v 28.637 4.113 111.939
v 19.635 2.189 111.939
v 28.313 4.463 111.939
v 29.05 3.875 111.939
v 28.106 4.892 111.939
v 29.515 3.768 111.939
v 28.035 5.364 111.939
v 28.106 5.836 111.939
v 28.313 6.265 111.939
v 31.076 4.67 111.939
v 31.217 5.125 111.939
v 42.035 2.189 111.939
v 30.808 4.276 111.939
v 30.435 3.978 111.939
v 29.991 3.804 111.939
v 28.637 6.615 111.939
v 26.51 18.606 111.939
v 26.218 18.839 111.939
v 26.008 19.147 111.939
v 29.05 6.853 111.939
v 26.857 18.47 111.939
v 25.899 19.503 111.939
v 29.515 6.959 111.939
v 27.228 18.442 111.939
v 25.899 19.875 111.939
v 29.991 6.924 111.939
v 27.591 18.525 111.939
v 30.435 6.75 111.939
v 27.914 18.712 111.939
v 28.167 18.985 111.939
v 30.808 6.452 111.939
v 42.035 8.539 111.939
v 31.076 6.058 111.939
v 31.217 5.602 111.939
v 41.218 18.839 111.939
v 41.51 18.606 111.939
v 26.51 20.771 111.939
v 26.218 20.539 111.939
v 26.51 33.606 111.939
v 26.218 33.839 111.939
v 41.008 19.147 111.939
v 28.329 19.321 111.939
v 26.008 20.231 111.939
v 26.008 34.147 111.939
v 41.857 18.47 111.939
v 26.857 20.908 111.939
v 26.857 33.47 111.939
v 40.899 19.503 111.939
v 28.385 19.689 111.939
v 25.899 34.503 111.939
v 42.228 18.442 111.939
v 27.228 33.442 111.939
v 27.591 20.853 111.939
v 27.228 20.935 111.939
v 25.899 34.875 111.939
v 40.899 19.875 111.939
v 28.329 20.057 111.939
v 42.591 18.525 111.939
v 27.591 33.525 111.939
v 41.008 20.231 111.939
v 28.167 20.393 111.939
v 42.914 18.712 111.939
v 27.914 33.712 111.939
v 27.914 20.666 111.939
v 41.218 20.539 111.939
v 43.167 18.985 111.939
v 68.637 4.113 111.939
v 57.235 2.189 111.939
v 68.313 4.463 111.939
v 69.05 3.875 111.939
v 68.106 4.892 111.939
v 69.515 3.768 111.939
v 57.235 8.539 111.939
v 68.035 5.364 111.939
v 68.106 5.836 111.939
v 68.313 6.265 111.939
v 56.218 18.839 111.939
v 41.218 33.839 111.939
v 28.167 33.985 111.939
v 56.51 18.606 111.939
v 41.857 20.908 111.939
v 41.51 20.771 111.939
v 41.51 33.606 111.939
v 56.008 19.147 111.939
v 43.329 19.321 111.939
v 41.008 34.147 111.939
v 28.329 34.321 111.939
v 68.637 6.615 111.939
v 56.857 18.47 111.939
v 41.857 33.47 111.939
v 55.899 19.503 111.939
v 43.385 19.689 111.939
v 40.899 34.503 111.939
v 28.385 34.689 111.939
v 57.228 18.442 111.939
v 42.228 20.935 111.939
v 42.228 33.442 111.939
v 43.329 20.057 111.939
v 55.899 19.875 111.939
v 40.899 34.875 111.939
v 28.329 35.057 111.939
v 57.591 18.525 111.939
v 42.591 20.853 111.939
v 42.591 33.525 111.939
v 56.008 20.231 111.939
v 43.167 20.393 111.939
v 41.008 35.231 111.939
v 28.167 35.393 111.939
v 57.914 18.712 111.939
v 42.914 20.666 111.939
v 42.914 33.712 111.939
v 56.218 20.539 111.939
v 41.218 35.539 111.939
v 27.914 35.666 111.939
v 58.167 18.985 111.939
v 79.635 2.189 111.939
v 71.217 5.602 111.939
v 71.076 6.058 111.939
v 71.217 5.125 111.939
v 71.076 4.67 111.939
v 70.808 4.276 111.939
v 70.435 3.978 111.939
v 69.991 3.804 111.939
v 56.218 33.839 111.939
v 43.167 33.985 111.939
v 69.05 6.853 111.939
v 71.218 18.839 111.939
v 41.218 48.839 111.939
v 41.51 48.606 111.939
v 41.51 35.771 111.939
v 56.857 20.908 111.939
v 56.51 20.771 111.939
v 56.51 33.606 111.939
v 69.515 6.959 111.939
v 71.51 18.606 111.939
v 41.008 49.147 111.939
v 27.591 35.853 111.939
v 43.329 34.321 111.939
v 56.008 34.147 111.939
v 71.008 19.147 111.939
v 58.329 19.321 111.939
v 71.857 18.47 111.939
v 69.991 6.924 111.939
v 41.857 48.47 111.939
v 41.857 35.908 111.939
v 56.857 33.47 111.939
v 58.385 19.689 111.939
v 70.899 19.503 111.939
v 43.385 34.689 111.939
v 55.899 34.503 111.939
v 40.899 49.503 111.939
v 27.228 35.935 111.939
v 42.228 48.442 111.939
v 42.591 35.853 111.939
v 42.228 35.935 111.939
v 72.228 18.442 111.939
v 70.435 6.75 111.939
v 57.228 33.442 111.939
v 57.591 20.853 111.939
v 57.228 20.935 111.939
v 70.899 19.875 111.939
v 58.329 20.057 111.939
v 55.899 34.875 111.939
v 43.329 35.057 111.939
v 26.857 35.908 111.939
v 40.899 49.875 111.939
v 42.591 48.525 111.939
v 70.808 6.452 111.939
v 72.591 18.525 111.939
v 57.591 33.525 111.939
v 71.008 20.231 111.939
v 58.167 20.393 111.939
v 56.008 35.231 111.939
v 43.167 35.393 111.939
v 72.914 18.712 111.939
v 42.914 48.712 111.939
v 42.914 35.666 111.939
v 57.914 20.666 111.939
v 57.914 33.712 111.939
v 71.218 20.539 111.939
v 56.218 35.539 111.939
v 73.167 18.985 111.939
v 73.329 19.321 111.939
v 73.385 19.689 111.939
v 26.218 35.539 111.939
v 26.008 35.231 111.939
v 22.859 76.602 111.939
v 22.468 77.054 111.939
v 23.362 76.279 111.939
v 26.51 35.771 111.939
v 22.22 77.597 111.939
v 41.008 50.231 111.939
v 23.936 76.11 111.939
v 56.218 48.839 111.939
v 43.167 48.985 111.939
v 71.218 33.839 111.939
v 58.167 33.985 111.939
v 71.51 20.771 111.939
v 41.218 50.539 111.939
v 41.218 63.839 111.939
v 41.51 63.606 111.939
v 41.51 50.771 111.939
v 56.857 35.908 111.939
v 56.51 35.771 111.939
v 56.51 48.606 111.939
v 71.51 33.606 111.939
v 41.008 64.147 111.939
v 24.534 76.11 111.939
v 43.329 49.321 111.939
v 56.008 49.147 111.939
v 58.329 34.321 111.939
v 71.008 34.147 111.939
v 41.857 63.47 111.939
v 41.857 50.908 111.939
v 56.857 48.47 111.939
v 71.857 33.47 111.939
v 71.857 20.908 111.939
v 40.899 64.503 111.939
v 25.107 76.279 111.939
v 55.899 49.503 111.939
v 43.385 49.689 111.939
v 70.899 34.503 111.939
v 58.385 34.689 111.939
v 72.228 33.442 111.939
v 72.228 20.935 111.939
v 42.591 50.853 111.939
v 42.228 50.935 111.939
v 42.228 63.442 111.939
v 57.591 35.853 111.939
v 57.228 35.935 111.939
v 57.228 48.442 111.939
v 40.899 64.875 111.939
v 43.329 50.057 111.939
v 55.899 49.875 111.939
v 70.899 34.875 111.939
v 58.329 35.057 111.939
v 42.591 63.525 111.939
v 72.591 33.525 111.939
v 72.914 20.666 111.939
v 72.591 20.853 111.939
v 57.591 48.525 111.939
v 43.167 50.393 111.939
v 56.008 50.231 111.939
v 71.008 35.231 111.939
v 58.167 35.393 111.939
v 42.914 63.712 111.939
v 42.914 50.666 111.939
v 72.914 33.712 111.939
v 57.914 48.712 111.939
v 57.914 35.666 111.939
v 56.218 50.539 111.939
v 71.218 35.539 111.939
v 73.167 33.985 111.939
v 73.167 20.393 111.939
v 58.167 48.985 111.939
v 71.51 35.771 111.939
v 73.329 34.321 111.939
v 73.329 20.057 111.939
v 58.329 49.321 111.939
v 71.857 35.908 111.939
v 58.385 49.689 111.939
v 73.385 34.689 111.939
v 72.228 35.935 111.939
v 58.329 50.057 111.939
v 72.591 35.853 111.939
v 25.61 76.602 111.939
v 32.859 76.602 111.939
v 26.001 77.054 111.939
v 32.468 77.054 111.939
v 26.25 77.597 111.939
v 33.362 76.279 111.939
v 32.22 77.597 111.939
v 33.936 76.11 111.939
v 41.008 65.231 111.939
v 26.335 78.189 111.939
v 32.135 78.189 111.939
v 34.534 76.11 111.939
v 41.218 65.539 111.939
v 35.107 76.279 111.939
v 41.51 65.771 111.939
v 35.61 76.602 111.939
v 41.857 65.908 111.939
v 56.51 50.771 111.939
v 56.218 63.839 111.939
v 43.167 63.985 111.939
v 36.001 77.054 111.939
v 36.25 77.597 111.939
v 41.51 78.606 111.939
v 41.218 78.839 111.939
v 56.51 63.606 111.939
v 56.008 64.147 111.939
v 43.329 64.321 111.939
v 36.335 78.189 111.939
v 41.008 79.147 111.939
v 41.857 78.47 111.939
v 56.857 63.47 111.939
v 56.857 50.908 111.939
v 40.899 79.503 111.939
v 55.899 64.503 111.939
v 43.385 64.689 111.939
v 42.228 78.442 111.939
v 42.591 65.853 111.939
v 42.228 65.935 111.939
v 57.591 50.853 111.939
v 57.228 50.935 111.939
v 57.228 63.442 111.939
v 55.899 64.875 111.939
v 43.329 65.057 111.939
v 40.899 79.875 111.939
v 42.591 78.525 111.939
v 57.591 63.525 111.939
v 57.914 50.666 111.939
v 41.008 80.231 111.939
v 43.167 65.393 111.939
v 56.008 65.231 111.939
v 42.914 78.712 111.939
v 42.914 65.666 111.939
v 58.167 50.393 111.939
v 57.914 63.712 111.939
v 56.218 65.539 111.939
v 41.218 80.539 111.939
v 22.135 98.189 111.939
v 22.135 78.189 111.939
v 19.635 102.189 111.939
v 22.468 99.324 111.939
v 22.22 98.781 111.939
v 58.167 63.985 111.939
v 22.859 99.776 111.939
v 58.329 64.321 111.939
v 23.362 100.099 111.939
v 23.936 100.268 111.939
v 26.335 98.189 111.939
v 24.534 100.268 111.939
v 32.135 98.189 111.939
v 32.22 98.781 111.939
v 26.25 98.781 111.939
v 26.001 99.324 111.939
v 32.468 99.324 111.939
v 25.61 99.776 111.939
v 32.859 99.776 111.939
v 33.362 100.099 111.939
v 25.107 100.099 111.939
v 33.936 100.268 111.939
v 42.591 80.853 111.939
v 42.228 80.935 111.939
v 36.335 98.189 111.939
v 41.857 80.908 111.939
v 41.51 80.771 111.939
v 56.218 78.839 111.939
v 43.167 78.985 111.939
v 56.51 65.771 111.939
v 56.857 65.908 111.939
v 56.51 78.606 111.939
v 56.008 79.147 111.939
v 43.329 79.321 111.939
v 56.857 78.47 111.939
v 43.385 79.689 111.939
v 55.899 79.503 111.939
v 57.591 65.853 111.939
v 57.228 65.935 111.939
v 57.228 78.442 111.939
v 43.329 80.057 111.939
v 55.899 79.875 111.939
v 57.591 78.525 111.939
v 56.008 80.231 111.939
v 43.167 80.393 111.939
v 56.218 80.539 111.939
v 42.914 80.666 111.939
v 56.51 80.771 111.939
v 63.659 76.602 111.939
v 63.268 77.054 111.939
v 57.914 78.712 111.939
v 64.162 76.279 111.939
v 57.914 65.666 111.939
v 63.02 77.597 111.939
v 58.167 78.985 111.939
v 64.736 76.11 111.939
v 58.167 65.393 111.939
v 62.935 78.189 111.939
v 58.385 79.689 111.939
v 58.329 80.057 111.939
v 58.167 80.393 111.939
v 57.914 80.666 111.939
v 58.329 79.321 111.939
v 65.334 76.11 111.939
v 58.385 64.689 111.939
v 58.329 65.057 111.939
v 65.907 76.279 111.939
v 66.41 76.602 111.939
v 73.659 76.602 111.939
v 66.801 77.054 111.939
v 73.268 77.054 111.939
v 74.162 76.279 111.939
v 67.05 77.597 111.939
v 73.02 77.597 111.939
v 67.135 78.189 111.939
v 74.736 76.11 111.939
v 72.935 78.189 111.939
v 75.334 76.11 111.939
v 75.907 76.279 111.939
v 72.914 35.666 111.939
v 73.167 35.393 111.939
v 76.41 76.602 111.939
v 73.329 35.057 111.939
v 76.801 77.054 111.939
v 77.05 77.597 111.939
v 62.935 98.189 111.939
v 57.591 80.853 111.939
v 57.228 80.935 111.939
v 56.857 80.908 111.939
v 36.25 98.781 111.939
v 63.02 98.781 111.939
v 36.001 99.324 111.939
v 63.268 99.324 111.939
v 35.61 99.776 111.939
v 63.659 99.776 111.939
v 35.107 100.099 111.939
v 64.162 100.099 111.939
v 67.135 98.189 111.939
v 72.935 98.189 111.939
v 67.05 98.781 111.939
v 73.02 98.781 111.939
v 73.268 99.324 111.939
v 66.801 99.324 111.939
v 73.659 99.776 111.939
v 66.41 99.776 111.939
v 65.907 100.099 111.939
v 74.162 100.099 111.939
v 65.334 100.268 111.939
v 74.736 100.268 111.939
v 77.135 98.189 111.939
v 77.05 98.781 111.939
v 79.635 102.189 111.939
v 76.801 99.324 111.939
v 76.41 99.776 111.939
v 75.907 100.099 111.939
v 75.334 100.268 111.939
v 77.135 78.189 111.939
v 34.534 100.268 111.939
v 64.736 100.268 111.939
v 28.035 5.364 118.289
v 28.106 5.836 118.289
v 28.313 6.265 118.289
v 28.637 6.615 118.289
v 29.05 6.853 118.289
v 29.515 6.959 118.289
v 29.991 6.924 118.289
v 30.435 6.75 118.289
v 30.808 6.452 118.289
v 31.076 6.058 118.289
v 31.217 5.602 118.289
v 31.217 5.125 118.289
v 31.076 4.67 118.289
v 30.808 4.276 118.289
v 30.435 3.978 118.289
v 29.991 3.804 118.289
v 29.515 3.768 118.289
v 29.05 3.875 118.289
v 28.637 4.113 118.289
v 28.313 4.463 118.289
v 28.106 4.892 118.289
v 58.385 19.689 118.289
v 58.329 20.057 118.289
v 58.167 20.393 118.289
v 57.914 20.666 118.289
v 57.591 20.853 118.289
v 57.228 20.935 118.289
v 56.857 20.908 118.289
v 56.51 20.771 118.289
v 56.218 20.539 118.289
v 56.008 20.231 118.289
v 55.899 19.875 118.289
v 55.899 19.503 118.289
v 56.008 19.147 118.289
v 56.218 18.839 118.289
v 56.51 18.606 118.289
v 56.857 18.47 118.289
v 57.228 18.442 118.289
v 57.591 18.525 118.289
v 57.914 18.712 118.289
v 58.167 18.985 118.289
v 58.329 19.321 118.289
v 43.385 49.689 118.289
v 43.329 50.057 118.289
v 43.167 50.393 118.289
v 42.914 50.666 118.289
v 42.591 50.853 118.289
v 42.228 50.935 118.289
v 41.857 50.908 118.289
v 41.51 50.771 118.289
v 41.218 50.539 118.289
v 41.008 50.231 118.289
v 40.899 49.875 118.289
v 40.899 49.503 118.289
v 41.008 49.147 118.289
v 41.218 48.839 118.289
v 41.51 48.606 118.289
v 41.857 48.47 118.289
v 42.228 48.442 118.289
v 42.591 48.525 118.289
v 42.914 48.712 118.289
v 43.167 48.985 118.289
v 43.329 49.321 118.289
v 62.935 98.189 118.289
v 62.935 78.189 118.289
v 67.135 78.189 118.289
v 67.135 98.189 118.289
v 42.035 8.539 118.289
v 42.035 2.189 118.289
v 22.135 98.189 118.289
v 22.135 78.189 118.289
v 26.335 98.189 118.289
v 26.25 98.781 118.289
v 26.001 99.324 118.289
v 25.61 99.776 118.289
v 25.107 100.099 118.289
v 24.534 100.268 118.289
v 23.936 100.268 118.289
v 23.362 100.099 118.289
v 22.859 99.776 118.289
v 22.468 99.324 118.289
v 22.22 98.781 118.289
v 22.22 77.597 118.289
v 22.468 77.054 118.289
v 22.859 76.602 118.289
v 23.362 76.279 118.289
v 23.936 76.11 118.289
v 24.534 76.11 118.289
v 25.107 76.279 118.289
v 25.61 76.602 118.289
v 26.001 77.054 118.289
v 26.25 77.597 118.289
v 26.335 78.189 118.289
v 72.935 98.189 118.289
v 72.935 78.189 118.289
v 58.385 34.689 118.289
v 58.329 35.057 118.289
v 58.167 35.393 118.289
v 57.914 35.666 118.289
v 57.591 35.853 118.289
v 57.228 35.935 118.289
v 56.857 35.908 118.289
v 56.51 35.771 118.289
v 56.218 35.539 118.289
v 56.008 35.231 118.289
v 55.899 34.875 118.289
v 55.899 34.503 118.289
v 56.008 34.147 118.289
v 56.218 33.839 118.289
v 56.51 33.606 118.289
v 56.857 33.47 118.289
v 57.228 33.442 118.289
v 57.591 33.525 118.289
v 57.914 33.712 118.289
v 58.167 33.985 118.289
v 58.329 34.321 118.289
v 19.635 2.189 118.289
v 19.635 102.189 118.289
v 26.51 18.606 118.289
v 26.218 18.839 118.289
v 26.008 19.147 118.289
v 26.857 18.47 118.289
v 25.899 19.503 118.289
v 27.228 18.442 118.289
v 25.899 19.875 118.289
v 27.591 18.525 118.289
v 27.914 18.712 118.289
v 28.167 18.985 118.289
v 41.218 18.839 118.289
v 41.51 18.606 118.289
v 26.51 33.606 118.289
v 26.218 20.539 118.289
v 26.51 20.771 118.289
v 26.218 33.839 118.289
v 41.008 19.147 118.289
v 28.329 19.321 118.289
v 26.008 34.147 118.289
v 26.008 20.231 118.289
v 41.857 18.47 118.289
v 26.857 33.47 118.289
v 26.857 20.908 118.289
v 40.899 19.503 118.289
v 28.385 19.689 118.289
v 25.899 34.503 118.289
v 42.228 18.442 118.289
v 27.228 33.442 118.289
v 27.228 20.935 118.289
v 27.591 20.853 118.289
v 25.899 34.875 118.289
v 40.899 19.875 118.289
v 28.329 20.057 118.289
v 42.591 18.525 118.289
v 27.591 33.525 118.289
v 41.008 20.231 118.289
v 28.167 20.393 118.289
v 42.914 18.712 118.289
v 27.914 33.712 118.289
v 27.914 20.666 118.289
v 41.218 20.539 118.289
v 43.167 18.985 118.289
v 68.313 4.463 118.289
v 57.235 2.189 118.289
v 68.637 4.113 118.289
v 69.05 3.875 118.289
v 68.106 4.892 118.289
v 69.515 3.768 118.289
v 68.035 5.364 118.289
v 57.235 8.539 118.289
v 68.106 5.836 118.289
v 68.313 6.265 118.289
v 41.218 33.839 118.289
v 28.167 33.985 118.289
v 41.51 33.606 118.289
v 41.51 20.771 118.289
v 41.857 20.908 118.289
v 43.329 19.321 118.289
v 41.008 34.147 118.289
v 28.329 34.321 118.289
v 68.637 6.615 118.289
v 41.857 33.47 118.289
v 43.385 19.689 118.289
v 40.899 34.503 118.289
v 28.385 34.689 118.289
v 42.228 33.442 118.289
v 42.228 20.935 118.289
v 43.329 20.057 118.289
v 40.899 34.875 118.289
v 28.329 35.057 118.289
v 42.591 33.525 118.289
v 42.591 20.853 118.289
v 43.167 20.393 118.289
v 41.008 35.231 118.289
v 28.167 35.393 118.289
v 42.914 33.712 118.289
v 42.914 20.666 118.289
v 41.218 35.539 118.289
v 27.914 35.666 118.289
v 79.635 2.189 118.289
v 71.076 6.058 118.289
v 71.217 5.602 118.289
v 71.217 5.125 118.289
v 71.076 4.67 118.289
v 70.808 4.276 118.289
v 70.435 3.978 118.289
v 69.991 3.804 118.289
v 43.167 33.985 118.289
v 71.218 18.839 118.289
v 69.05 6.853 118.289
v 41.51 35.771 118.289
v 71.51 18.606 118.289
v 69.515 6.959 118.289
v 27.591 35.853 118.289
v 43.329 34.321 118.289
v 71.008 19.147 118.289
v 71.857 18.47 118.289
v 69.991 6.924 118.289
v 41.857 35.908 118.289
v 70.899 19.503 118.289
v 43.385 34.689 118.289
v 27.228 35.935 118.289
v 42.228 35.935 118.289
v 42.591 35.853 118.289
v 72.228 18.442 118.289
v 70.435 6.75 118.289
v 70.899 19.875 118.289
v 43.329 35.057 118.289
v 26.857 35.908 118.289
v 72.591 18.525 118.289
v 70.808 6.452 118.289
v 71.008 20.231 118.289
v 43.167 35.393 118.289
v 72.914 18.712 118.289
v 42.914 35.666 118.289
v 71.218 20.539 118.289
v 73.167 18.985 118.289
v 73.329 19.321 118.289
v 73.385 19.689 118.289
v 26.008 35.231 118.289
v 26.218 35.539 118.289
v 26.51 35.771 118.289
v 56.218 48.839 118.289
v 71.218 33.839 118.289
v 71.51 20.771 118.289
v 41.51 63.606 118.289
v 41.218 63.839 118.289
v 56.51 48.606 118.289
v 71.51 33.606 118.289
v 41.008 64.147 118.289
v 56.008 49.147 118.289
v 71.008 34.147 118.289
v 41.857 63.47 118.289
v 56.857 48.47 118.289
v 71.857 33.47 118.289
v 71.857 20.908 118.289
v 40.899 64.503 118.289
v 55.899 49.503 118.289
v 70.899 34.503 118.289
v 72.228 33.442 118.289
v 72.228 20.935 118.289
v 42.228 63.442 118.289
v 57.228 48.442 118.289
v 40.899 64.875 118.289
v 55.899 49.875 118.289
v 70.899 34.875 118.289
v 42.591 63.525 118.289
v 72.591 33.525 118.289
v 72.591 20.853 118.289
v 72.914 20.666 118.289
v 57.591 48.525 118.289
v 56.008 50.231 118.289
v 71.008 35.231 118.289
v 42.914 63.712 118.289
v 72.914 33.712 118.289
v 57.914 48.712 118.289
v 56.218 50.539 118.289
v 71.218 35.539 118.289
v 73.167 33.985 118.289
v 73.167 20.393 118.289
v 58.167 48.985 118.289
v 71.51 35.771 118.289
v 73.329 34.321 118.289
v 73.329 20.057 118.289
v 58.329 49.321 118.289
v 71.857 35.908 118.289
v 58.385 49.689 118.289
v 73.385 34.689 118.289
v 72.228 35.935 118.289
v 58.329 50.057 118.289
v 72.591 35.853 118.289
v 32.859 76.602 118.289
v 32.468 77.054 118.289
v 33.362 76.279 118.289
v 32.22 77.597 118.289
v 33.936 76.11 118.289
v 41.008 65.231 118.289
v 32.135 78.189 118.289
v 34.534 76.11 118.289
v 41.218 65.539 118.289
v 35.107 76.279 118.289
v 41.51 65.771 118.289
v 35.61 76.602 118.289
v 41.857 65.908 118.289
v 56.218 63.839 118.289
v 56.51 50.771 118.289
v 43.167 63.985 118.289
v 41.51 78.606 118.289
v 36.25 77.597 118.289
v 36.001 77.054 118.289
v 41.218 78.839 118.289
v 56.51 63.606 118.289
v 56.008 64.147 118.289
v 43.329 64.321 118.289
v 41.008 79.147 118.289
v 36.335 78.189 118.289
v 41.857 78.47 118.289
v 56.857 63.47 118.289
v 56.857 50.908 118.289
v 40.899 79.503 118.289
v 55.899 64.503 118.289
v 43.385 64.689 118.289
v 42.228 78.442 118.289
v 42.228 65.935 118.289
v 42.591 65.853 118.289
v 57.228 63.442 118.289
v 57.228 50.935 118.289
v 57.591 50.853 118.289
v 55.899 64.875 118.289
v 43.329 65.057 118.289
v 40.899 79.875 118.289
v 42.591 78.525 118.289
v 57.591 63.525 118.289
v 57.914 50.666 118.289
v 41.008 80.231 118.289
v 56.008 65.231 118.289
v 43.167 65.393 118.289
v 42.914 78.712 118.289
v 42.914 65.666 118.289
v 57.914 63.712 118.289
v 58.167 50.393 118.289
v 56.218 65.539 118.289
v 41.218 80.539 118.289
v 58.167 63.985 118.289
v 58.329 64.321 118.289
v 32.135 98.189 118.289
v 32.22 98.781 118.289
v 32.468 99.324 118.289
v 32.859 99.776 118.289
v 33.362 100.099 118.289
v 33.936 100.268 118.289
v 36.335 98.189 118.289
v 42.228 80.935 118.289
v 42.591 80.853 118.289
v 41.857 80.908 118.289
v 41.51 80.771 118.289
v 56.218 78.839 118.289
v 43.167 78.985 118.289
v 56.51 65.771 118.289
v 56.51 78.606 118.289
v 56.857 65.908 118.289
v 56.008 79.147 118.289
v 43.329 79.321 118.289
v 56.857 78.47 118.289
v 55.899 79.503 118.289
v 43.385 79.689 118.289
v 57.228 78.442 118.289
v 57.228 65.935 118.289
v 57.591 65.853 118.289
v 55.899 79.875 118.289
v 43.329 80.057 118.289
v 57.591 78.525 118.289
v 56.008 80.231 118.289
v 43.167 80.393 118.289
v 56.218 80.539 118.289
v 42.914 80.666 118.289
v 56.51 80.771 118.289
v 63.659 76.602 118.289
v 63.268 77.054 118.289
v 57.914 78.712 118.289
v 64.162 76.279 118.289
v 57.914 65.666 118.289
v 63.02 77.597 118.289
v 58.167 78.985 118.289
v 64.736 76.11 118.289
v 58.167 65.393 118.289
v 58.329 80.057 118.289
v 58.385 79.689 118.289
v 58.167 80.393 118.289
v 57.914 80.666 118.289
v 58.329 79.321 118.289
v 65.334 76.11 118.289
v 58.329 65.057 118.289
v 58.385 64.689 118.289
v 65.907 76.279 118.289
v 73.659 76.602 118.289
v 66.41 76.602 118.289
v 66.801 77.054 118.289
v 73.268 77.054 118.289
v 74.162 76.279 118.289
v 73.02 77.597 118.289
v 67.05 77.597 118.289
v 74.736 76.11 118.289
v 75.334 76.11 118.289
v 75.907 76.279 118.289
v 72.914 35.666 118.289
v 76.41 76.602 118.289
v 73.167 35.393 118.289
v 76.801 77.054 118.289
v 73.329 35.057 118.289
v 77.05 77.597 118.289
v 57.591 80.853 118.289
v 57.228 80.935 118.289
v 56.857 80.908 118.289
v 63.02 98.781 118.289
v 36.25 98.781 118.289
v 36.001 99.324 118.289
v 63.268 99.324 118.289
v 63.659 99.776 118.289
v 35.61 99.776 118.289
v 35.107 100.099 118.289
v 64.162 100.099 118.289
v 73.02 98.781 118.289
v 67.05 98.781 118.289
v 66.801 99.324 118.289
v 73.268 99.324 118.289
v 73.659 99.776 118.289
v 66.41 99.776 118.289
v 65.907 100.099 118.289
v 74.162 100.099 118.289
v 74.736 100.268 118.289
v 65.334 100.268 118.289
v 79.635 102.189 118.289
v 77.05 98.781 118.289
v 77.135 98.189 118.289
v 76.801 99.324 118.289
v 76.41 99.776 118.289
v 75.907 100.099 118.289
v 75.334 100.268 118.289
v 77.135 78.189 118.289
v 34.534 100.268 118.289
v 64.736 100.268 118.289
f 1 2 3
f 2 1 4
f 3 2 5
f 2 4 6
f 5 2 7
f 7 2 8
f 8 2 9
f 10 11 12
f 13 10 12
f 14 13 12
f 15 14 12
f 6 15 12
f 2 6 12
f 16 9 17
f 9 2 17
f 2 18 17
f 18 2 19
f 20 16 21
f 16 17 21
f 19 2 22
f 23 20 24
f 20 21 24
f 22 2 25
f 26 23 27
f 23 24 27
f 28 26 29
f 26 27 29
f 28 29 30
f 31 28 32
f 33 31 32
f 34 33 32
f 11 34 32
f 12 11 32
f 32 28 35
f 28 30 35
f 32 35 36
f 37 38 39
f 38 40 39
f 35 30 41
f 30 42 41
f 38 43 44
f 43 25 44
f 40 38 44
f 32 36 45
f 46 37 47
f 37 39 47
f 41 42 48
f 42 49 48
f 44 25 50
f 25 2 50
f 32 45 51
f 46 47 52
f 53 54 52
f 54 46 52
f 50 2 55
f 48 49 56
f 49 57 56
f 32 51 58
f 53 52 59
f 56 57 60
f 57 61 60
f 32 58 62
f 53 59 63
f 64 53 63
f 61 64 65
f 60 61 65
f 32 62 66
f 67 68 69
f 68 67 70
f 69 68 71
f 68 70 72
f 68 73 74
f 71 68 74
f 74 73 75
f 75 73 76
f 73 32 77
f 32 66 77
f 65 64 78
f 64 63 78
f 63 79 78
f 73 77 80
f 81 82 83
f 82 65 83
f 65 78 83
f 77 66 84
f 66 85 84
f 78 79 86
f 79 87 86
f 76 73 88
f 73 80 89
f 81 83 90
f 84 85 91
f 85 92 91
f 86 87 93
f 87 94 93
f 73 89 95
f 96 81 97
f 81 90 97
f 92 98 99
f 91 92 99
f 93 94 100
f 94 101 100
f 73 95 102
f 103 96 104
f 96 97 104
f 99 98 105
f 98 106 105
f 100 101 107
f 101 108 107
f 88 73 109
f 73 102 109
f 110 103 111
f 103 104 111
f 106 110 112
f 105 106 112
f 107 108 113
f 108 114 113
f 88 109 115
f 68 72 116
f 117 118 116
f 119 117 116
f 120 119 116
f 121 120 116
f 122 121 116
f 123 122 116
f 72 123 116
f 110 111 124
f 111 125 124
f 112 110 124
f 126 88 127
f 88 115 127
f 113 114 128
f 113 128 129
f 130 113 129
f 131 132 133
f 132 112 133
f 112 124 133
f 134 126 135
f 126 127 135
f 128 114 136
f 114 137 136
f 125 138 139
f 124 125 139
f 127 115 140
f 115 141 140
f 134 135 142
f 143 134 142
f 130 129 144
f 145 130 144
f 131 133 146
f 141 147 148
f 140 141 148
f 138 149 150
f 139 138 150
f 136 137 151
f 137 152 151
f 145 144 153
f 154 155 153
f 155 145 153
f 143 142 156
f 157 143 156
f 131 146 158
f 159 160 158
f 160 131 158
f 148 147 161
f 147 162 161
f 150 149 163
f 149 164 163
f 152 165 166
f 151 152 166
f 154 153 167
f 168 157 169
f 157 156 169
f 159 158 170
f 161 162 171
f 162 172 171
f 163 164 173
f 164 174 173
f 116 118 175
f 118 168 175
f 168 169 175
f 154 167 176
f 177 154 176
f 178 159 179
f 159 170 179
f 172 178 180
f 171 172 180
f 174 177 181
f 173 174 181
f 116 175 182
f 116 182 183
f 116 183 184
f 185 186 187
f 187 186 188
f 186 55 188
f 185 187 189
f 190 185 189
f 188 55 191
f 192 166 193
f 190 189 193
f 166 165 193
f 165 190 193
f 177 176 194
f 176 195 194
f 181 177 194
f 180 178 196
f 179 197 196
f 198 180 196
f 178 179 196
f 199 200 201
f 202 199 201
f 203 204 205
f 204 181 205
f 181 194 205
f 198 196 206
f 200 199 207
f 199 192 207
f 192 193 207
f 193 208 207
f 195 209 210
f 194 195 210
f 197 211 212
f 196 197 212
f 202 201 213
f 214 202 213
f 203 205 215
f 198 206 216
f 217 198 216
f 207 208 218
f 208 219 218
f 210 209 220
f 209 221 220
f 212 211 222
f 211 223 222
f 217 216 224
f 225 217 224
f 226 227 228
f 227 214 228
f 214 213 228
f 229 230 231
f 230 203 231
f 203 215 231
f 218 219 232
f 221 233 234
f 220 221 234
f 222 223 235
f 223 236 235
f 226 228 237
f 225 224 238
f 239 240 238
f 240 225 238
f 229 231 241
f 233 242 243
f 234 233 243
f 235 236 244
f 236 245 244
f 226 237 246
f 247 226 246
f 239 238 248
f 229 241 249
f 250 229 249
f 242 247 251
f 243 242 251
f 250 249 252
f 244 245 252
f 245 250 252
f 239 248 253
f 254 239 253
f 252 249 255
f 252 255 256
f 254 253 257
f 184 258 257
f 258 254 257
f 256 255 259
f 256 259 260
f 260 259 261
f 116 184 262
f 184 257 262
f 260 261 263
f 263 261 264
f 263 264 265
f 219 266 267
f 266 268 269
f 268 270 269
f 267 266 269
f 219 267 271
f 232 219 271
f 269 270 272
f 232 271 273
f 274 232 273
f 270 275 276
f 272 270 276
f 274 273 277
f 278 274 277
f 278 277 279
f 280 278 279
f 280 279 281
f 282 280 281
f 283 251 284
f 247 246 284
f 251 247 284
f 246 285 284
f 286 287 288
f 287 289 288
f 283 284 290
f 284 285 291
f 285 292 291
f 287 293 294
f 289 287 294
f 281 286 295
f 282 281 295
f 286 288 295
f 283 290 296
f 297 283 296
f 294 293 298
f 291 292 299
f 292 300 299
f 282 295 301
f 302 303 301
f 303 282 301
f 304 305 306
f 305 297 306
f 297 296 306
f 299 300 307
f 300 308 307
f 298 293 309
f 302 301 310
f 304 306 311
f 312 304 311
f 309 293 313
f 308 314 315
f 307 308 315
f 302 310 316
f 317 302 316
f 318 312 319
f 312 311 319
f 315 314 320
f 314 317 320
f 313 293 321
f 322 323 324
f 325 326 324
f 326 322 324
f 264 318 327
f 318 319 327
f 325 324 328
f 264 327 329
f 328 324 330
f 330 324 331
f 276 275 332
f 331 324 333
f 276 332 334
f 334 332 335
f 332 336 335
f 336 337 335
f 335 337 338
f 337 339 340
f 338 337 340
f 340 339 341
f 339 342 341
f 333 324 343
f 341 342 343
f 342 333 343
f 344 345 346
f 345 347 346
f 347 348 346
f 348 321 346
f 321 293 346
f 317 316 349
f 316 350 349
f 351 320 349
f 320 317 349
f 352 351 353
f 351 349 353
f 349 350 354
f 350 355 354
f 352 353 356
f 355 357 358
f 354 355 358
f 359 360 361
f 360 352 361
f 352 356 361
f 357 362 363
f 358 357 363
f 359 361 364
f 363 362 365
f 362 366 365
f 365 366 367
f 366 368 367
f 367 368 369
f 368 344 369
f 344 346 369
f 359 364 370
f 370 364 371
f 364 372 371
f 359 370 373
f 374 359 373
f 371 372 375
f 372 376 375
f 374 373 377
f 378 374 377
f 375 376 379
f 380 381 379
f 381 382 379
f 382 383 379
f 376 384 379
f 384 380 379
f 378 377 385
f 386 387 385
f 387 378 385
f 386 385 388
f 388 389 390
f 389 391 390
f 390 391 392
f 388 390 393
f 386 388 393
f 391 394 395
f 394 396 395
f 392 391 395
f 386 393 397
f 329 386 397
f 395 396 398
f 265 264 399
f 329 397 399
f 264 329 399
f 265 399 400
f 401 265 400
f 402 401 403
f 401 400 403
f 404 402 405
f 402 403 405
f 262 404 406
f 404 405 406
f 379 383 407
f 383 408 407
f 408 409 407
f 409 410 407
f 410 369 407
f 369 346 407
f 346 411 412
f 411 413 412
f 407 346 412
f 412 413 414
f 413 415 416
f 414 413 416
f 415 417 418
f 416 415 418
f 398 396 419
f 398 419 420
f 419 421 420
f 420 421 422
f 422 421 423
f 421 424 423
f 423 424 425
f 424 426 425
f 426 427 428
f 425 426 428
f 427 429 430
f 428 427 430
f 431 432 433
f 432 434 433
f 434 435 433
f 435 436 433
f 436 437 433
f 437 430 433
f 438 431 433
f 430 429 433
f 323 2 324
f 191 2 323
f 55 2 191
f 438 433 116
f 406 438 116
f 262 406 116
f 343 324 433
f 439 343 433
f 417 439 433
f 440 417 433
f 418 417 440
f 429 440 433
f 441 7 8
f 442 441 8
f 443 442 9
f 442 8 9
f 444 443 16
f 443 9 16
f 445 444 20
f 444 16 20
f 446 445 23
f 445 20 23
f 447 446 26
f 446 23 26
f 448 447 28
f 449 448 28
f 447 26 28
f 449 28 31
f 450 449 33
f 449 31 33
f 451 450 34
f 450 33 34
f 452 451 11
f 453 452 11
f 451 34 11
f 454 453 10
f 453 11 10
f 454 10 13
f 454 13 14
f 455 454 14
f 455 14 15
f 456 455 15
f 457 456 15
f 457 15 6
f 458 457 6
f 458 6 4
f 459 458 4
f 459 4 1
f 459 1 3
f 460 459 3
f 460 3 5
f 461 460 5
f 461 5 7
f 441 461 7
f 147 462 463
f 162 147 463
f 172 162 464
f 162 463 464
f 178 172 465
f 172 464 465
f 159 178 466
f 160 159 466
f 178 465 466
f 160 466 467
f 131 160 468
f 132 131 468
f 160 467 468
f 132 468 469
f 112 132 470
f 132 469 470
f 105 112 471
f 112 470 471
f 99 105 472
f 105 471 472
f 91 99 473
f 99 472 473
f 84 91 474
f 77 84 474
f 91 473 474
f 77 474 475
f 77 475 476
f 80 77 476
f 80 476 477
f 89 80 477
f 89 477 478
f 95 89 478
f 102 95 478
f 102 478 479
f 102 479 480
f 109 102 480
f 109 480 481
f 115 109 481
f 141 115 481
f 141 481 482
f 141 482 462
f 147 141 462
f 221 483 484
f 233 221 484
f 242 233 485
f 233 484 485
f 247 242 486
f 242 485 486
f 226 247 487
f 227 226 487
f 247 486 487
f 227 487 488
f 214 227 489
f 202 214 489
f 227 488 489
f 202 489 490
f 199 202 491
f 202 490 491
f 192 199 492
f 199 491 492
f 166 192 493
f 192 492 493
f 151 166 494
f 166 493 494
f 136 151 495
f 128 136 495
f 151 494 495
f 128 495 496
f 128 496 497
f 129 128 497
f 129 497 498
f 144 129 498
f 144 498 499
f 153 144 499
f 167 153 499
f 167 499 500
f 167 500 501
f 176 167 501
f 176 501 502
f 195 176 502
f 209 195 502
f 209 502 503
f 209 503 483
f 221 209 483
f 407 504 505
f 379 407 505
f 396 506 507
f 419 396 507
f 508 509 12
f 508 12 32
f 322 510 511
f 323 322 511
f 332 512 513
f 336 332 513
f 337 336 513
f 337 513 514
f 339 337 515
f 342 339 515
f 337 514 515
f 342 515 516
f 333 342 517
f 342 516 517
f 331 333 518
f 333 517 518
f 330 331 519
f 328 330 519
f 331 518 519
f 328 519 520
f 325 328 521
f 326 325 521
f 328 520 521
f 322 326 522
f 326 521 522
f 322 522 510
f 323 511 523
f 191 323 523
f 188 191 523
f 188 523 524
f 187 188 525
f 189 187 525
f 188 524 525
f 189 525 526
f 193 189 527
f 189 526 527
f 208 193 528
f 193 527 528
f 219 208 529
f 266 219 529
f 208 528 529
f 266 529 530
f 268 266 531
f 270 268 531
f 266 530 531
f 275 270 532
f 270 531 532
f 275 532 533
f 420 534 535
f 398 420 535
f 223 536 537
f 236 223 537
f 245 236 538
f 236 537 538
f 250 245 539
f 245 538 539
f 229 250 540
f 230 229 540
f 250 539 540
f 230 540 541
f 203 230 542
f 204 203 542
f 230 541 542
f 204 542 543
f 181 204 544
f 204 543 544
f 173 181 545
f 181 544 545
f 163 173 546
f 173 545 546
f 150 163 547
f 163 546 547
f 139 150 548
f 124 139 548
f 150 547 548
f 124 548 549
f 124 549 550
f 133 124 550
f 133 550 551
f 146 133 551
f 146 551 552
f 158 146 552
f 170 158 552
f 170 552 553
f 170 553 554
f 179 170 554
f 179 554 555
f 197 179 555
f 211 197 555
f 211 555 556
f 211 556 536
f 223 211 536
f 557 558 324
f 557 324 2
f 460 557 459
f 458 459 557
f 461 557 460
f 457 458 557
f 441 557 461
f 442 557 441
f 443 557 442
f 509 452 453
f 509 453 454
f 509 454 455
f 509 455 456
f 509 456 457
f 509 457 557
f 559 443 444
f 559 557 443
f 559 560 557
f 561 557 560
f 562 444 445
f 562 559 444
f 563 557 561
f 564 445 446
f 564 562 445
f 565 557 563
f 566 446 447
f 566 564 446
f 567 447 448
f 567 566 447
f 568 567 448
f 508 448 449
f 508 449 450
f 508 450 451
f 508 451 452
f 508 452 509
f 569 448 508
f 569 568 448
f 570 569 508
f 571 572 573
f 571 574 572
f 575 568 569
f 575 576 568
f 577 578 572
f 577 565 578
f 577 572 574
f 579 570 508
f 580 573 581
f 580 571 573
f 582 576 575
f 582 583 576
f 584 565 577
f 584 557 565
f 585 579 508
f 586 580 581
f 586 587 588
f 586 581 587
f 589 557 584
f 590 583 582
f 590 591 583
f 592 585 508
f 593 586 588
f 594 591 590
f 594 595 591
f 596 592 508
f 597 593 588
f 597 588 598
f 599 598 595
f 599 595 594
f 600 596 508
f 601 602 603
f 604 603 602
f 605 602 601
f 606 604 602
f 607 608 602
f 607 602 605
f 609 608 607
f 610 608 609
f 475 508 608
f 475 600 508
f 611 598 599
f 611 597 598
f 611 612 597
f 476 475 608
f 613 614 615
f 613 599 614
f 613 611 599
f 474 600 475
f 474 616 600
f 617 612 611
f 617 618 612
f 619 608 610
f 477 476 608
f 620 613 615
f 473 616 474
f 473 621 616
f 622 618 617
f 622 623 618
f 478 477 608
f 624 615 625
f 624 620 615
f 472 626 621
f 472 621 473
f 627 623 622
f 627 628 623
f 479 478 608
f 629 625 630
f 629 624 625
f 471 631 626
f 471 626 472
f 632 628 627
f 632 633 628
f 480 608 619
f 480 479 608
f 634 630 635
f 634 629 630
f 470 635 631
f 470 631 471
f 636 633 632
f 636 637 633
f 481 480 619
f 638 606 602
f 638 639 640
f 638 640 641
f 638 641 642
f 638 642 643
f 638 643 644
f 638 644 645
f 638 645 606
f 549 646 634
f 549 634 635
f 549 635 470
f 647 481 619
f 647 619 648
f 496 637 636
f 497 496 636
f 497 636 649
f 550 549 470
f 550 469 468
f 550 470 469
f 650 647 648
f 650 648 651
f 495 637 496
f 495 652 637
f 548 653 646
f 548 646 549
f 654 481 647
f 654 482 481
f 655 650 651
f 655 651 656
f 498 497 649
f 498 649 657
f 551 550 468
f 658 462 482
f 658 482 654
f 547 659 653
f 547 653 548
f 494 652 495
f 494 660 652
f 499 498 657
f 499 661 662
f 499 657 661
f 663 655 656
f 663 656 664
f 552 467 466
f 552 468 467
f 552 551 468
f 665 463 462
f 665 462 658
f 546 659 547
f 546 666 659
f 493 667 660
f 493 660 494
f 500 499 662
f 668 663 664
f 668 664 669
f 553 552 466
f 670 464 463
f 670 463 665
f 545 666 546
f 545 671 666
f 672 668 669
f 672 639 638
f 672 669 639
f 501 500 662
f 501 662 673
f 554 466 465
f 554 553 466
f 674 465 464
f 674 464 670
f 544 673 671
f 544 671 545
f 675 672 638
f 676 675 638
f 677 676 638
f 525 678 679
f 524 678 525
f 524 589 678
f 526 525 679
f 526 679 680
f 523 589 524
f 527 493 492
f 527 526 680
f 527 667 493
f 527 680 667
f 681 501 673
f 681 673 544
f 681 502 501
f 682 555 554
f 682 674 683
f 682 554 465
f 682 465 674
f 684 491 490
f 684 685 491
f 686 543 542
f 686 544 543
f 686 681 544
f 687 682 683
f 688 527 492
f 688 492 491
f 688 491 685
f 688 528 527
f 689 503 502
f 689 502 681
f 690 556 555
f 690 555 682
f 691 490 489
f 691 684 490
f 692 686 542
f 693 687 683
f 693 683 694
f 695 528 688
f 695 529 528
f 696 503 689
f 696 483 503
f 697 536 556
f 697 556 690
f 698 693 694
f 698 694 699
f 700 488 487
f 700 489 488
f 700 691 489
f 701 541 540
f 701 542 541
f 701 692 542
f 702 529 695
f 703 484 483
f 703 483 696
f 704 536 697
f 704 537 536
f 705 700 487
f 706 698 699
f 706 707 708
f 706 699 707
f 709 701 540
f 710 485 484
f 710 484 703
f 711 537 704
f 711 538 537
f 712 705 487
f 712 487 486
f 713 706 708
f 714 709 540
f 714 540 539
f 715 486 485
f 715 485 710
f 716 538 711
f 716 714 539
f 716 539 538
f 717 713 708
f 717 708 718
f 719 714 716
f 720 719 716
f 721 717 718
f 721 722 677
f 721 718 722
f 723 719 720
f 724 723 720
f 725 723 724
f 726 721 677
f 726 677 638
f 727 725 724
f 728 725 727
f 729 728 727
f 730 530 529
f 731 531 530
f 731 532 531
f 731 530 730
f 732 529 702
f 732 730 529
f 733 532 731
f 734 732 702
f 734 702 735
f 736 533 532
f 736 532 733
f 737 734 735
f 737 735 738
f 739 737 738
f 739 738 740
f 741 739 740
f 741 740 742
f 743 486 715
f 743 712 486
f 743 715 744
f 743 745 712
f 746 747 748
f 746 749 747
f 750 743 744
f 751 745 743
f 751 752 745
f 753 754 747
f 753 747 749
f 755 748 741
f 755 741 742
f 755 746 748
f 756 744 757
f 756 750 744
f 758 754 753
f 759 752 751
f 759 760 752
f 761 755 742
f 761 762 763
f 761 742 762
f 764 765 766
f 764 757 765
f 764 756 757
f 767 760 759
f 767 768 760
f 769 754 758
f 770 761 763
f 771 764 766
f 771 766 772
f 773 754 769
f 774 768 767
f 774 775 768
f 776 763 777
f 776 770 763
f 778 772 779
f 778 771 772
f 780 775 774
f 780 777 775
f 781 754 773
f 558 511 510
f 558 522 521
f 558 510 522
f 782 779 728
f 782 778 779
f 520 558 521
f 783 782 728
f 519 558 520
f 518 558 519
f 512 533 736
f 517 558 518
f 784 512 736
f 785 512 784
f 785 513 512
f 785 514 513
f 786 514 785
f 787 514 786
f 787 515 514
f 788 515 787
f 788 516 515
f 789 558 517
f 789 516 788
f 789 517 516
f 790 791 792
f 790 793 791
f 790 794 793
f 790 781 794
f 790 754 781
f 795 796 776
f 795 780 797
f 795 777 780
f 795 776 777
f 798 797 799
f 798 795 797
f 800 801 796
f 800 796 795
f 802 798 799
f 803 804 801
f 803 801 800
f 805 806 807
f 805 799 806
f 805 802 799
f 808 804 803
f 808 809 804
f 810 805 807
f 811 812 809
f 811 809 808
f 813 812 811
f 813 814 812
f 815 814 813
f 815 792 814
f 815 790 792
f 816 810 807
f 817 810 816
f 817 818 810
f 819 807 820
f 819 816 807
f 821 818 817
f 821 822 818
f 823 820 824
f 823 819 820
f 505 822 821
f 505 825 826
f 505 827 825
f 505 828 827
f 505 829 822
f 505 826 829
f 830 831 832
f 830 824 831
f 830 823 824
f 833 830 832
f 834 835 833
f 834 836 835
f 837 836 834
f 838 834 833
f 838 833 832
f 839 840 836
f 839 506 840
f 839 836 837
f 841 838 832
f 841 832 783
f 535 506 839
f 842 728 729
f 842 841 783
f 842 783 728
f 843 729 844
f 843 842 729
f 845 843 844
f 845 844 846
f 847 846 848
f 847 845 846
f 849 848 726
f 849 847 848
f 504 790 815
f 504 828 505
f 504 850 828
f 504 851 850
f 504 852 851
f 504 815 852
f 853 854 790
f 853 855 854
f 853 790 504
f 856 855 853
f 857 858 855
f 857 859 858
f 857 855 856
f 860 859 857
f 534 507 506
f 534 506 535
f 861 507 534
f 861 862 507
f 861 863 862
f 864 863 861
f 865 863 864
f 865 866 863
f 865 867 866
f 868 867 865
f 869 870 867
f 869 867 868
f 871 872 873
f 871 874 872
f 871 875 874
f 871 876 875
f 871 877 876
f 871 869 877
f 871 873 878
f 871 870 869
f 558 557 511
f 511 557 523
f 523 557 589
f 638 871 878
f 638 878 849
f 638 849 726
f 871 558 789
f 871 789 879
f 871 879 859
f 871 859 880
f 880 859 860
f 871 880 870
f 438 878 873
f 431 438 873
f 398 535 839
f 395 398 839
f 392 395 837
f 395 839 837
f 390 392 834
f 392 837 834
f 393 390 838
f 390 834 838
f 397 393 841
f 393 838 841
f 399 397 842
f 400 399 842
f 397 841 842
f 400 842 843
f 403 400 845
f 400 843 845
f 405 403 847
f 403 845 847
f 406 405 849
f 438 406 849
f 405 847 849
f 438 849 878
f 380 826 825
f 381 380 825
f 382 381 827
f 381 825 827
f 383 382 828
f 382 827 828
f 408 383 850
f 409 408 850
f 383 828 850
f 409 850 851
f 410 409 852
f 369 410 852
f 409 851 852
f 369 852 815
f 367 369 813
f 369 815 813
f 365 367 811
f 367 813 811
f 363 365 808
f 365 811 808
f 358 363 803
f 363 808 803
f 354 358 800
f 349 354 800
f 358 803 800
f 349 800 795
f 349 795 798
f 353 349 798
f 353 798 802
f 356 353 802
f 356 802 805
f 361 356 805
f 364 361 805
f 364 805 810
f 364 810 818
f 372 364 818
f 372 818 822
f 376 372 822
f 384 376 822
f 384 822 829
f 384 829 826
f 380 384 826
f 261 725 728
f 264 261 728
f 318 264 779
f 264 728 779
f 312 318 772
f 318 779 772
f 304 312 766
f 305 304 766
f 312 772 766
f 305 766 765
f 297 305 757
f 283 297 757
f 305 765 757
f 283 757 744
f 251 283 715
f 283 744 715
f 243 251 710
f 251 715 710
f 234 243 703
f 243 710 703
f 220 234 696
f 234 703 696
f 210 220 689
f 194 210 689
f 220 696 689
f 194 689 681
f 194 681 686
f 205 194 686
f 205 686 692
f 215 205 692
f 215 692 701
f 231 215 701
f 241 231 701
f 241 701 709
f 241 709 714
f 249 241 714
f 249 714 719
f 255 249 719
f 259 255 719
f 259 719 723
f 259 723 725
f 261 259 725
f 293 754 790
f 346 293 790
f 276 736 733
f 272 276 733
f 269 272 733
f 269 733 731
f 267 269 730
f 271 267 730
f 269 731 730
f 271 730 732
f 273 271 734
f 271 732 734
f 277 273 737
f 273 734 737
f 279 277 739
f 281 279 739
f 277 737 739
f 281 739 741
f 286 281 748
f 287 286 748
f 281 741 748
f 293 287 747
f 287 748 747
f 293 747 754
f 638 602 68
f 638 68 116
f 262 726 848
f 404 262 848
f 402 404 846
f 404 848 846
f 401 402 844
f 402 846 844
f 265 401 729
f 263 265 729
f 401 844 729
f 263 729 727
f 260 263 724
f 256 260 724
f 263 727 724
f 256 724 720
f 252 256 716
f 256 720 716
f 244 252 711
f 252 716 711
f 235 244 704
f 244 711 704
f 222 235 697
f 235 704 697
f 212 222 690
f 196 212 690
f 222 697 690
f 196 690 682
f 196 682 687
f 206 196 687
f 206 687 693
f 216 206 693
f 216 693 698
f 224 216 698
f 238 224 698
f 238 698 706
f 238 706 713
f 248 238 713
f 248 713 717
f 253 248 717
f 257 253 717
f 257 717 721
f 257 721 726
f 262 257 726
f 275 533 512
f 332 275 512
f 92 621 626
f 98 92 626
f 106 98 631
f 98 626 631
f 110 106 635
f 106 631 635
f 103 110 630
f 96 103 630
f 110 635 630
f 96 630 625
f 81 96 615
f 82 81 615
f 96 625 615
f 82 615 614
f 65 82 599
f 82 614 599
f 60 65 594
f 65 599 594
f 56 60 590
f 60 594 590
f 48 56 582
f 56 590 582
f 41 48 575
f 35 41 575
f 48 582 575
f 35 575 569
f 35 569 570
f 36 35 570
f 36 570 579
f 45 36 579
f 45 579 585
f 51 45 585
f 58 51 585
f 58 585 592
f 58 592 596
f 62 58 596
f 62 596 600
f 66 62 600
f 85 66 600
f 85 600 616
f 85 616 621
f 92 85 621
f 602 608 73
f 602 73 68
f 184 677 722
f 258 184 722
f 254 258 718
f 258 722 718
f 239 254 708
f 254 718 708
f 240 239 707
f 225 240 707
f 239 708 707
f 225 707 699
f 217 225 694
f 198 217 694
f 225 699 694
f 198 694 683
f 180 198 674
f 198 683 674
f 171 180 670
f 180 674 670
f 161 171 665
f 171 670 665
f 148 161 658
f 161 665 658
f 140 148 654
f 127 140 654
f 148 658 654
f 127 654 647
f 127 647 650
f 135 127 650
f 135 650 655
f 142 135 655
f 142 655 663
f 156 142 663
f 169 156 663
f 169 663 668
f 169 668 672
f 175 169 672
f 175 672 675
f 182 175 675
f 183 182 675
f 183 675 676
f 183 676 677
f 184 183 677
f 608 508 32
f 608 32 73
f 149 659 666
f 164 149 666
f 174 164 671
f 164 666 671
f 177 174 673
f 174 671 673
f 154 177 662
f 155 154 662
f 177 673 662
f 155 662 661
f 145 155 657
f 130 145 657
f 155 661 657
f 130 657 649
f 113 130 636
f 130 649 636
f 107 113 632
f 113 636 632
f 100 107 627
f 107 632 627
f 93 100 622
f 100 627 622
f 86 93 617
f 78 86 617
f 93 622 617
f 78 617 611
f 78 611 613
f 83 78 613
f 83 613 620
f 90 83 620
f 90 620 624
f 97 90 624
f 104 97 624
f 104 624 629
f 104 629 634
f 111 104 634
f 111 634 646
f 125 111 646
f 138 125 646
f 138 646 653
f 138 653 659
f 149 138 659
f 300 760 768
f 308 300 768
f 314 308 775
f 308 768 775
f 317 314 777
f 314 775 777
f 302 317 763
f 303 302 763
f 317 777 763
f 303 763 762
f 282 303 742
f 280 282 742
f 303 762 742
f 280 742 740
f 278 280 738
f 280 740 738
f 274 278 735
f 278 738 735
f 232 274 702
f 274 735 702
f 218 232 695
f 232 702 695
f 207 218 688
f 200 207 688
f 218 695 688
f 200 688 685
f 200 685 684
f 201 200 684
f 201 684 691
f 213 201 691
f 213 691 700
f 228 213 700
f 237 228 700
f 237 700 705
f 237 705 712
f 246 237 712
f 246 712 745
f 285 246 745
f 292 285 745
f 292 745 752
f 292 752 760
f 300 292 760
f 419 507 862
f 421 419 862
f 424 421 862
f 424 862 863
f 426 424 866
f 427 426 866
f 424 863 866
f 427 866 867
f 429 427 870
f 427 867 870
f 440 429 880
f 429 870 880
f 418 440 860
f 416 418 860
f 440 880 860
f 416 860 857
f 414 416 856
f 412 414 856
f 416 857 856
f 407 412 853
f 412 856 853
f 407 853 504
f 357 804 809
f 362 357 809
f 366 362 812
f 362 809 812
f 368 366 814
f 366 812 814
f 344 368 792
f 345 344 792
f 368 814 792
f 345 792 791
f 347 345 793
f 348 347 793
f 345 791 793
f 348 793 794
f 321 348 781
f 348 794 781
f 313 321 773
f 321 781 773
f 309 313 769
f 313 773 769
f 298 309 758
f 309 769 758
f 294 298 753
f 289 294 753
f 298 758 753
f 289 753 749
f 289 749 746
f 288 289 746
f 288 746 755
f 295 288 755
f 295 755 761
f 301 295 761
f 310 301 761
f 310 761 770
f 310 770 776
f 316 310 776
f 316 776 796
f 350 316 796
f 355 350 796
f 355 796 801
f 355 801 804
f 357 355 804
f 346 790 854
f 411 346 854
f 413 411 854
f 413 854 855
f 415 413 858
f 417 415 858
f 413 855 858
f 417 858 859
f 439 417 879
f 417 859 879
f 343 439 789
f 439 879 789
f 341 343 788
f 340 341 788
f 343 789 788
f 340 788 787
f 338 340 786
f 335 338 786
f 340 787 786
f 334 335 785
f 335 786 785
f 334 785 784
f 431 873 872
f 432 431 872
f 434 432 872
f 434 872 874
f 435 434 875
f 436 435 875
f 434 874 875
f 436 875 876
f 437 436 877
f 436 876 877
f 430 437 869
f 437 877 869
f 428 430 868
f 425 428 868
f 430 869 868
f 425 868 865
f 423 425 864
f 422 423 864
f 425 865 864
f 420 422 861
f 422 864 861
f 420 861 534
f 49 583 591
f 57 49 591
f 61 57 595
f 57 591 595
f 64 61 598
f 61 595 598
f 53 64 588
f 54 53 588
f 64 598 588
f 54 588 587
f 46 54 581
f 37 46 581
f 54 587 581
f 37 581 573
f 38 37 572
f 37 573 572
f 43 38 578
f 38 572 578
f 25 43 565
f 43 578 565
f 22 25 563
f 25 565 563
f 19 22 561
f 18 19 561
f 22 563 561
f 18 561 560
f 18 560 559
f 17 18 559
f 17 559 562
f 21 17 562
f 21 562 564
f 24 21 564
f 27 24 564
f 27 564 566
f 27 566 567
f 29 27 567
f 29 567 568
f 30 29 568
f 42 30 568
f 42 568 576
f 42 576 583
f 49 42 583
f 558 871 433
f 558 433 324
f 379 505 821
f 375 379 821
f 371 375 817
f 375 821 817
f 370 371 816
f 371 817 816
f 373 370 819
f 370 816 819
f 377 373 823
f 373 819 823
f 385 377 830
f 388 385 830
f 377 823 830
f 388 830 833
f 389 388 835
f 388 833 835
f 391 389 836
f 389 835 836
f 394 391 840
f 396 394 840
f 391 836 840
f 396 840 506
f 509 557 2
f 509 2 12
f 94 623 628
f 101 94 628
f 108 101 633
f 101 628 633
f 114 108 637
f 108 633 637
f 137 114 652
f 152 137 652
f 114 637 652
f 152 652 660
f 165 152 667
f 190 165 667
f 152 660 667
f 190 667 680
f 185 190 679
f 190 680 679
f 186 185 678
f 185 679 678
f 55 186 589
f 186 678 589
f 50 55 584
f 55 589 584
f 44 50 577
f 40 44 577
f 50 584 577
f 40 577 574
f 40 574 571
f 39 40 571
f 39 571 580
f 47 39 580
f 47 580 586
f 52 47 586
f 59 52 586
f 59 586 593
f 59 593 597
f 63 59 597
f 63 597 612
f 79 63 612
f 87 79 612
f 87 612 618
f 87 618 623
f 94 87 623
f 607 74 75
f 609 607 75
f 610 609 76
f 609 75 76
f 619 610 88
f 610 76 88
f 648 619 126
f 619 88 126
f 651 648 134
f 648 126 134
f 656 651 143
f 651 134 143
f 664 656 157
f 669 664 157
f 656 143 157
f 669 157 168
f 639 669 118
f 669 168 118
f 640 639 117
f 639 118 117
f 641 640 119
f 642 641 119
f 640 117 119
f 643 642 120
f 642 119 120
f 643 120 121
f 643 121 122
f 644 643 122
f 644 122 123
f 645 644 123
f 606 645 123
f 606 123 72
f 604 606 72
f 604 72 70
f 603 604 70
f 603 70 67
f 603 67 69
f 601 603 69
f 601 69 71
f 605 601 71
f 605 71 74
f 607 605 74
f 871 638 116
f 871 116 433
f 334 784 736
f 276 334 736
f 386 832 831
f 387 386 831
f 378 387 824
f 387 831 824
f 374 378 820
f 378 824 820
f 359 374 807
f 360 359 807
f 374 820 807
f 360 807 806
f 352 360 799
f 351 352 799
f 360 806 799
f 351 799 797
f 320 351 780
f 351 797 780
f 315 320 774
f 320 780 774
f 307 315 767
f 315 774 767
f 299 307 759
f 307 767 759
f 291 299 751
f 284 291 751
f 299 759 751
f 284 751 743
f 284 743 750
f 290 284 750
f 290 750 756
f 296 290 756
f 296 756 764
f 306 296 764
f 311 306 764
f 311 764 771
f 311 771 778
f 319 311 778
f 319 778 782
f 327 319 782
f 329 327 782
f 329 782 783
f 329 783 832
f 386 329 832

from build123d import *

# Parameters (mm, degrees)
BOSS_EXTRUDE1_DEPTH             = 6.35
F_2_5_2_5_DIAMETER_HOLE1_D      = 2.5
F_2_5_2_5_DIAMETER_HOLE1_DEPTH  = 6.35
F_3_2_3_2_DIAMETER_HOLE1_D      = 3.2
F_3_2_3_2_DIAMETER_HOLE1_DEPTH  = 6.35
F_2_5_2_5_DIAMETER_HOLE2_D      = 2.5
F_2_5_2_5_DIAMETER_HOLE2_DEPTH  = 6.35
F_2_5_2_5_DIAMETER_HOLE3_D      = 2.5
F_2_5_2_5_DIAMETER_HOLE3_DEPTH  = 6.35
F_2_5_2_5_DIAMETER_HOLE4_D      = 2.5
F_2_5_2_5_DIAMETER_HOLE4_DEPTH  = 6.35
F_2_5_2_5_DIAMETER_HOLE5_D      = 2.5
F_2_5_2_5_DIAMETER_HOLE5_DEPTH  = 6.35
F_2_5_2_5_DIAMETER_HOLE6_D      = 2.5
F_2_5_2_5_DIAMETER_HOLE6_DEPTH  = 6.35
F_2_5_2_5_DIAMETER_HOLE7_D      = 2.5
F_2_5_2_5_DIAMETER_HOLE7_DEPTH  = 6.35
F_2_5_2_5_DIAMETER_HOLE8_D      = 2.5
F_2_5_2_5_DIAMETER_HOLE8_DEPTH  = 6.35
F_2_5_2_5_DIAMETER_HOLE9_D      = 2.5
F_2_5_2_5_DIAMETER_HOLE9_DEPTH  = 6.35
F_2_5_2_5_DIAMETER_HOLE10_D     = 2.5
F_2_5_2_5_DIAMETER_HOLE10_DEPTH = 6.35
F_2_5_2_5_DIAMETER_HOLE11_D     = 2.5
F_2_5_2_5_DIAMETER_HOLE11_DEPTH = 6.35
F_2_5_2_5_DIAMETER_HOLE12_D     = 2.5
F_2_5_2_5_DIAMETER_HOLE12_DEPTH = 6.35
F_2_5_2_5_DIAMETER_HOLE13_D     = 2.5
F_2_5_2_5_DIAMETER_HOLE13_DEPTH = 6.35
F_2_5_2_5_DIAMETER_HOLE14_D     = 2.5
F_2_5_2_5_DIAMETER_HOLE14_DEPTH = 6.35
F_3_2_3_2_DIAMETER_HOLE2_D      = 3.2
F_3_2_3_2_DIAMETER_HOLE2_DEPTH  = 6.35
CUT_EXTRUDE1_DEPTH              = 7.35


with BuildPart() as part:
    # Sketch1 → Boss-Extrude1 (new body)
    with BuildSketch(Plane.XY.offset(118.288574318)):
        Polygon((19.634665341, 102.188959457), (19.634665341, 2.188959457), (42.034665341, 2.188959457), (42.034665341, 8.538959457), (57.234665341, 8.538959457), (57.234665341, 2.188959457), (79.634665341, 2.188959457), (79.634665341, 102.188959457), align=None)
    extrude(amount=-BOSS_EXTRUDE1_DEPTH)

    # Ø2.5 (2.5) Diameter Hole1
    with Locations(Plane(origin=(0, 0, 111.938574318), x_dir=(-1, 0, 0), z_dir=(0, 0, -1))):
        with Locations((-27.134665341, 19.688959457)):
            Hole(F_2_5_2_5_DIAMETER_HOLE1_D / 2, depth=F_2_5_2_5_DIAMETER_HOLE1_DEPTH)

    # Ø3.2 (3.2) Diameter Hole1
    with Locations(Plane.XY.offset(118.288574318)):
        with Locations((29.634665341, 5.363959457)):
            Hole(F_3_2_3_2_DIAMETER_HOLE1_D / 2, depth=F_3_2_3_2_DIAMETER_HOLE1_DEPTH)

    # Ø2.5 (2.5) Diameter Hole2
    with Locations(Plane(origin=(0, 0, 111.938574318), x_dir=(-1, 0, 0), z_dir=(0, 0, -1))):
        with Locations((-57.134665341, 19.688959457)):
            Hole(F_2_5_2_5_DIAMETER_HOLE2_D / 2, depth=F_2_5_2_5_DIAMETER_HOLE2_DEPTH)

    # Ø2.5 (2.5) Diameter Hole3
    with Locations(Plane(origin=(0, 0, 111.938574318), x_dir=(-1, 0, 0), z_dir=(0, 0, -1))):
        with Locations((-42.134665341, 34.688959457)):
            Hole(F_2_5_2_5_DIAMETER_HOLE3_D / 2, depth=F_2_5_2_5_DIAMETER_HOLE3_DEPTH)

    # Ø2.5 (2.5) Diameter Hole4
    with Locations(Plane(origin=(0, 0, 111.938574318), x_dir=(-1, 0, 0), z_dir=(0, 0, -1))):
        with Locations((-42.134665341, 64.688959457)):
            Hole(F_2_5_2_5_DIAMETER_HOLE4_D / 2, depth=F_2_5_2_5_DIAMETER_HOLE4_DEPTH)

    # Ø2.5 (2.5) Diameter Hole5
    with Locations(Plane(origin=(0, 0, 111.938574318), x_dir=(-1, 0, 0), z_dir=(0, 0, -1))):
        with Locations((-57.134665341, 64.688959457)):
            Hole(F_2_5_2_5_DIAMETER_HOLE5_D / 2, depth=F_2_5_2_5_DIAMETER_HOLE5_DEPTH)

    # Ø2.5 (2.5) Diameter Hole6
    with Locations(Plane(origin=(0, 0, 111.938574318), x_dir=(-1, 0, 0), z_dir=(0, 0, -1))):
        with Locations((-27.134665341, 34.688959457)):
            Hole(F_2_5_2_5_DIAMETER_HOLE6_D / 2, depth=F_2_5_2_5_DIAMETER_HOLE6_DEPTH)

    # Ø2.5 (2.5) Diameter Hole7
    with Locations(Plane(origin=(0, 0, 111.938574318), x_dir=(-1, 0, 0), z_dir=(0, 0, -1))):
        with Locations((-72.134665341, 19.688959457)):
            Hole(F_2_5_2_5_DIAMETER_HOLE7_D / 2, depth=F_2_5_2_5_DIAMETER_HOLE7_DEPTH)

    # Ø2.5 (2.5) Diameter Hole8
    with Locations(Plane(origin=(0, 0, 111.938574318), x_dir=(-1, 0, 0), z_dir=(0, 0, -1))):
        with Locations((-42.134665341, 19.688959457)):
            Hole(F_2_5_2_5_DIAMETER_HOLE8_D / 2, depth=F_2_5_2_5_DIAMETER_HOLE8_DEPTH)

    # Ø2.5 (2.5) Diameter Hole9
    with Locations(Plane(origin=(0, 0, 111.938574318), x_dir=(-1, 0, 0), z_dir=(0, 0, -1))):
        with Locations((-57.134665341, 34.688959457)):
            Hole(F_2_5_2_5_DIAMETER_HOLE9_D / 2, depth=F_2_5_2_5_DIAMETER_HOLE9_DEPTH)

    # Ø2.5 (2.5) Diameter Hole10
    with Locations(Plane(origin=(0, 0, 111.938574318), x_dir=(-1, 0, 0), z_dir=(0, 0, -1))):
        with Locations((-42.134665341, 49.688959457)):
            Hole(F_2_5_2_5_DIAMETER_HOLE10_D / 2, depth=F_2_5_2_5_DIAMETER_HOLE10_DEPTH)

    # Ø2.5 (2.5) Diameter Hole11
    with Locations(Plane(origin=(0, 0, 111.938574318), x_dir=(-1, 0, 0), z_dir=(0, 0, -1))):
        with Locations((-42.134665341, 79.688959457)):
            Hole(F_2_5_2_5_DIAMETER_HOLE11_D / 2, depth=F_2_5_2_5_DIAMETER_HOLE11_DEPTH)

    # Ø2.5 (2.5) Diameter Hole12
    with Locations(Plane(origin=(0, 0, 111.938574318), x_dir=(-1, 0, 0), z_dir=(0, 0, -1))):
        with Locations((-57.134665341, 79.688959457)):
            Hole(F_2_5_2_5_DIAMETER_HOLE12_D / 2, depth=F_2_5_2_5_DIAMETER_HOLE12_DEPTH)

    # Ø2.5 (2.5) Diameter Hole13
    with Locations(Plane(origin=(0, 0, 111.938574318), x_dir=(-1, 0, 0), z_dir=(0, 0, -1))):
        with Locations((-57.134665341, 49.688959457)):
            Hole(F_2_5_2_5_DIAMETER_HOLE13_D / 2, depth=F_2_5_2_5_DIAMETER_HOLE13_DEPTH)

    # Ø2.5 (2.5) Diameter Hole14
    with Locations(Plane(origin=(0, 0, 111.938574318), x_dir=(-1, 0, 0), z_dir=(0, 0, -1))):
        with Locations((-72.134665341, 34.688959457)):
            Hole(F_2_5_2_5_DIAMETER_HOLE14_D / 2, depth=F_2_5_2_5_DIAMETER_HOLE14_DEPTH)

    # Ø3.2 (3.2) Diameter Hole2
    with Locations(Plane.XY.offset(118.288574318)):
        with Locations((69.634665341, 5.363959457)):
            Hole(F_3_2_3_2_DIAMETER_HOLE2_D / 2, depth=F_3_2_3_2_DIAMETER_HOLE2_DEPTH)

    # Sketch38 → Cut-Extrude1 (cut, through all)
    with BuildSketch(Plane.XY.offset(118.288574318)):
        with BuildLine():
            Line((22.134665341, 98.188959457), (22.134665341, 78.188959457))
            ThreePointArc((22.134665341, 78.188959457), (24.234665341, 76.088959457), (26.334665341, 78.188959457))
            Line((26.334665341, 78.188959457), (26.334665341, 98.188959457))
            ThreePointArc((26.334665341, 98.188959457), (24.234665341, 100.288959457), (22.134665341, 98.188959457))
        make_face()
        with BuildLine():
            Line((32.134665341, 98.188959457), (32.134665341, 78.188959457))
            ThreePointArc((32.134665341, 78.188959457), (34.234665341, 76.088959457), (36.334665341, 78.188959457))
            Line((36.334665341, 78.188959457), (36.334665341, 98.188959457))
            ThreePointArc((36.334665341, 98.188959457), (34.234665341, 100.288959457), (32.134665341, 98.188959457))
        make_face()
        with BuildLine():
            Line((62.934665341, 98.188959457), (62.934665341, 78.188959457))
            ThreePointArc((62.934665341, 78.188959457), (65.034665341, 76.088959457), (67.134665341, 78.188959457))
            Line((67.134665341, 78.188959457), (67.134665341, 98.188959457))
            ThreePointArc((67.134665341, 98.188959457), (65.034665341, 100.288959457), (62.934665341, 98.188959457))
        make_face()
        with BuildLine():
            Line((72.934665341, 98.188959457), (72.934665341, 78.188959457))
            ThreePointArc((72.934665341, 78.188959457), (75.034665341, 76.088959457), (77.134665341, 78.188959457))
            Line((77.134665341, 78.188959457), (77.134665341, 98.188959457))
            ThreePointArc((77.134665341, 98.188959457), (75.034665341, 100.288959457), (72.934665341, 98.188959457))
        make_face()
    extrude(amount=-CUT_EXTRUDE1_DEPTH, mode=Mode.SUBTRACT)


solid = part.part
